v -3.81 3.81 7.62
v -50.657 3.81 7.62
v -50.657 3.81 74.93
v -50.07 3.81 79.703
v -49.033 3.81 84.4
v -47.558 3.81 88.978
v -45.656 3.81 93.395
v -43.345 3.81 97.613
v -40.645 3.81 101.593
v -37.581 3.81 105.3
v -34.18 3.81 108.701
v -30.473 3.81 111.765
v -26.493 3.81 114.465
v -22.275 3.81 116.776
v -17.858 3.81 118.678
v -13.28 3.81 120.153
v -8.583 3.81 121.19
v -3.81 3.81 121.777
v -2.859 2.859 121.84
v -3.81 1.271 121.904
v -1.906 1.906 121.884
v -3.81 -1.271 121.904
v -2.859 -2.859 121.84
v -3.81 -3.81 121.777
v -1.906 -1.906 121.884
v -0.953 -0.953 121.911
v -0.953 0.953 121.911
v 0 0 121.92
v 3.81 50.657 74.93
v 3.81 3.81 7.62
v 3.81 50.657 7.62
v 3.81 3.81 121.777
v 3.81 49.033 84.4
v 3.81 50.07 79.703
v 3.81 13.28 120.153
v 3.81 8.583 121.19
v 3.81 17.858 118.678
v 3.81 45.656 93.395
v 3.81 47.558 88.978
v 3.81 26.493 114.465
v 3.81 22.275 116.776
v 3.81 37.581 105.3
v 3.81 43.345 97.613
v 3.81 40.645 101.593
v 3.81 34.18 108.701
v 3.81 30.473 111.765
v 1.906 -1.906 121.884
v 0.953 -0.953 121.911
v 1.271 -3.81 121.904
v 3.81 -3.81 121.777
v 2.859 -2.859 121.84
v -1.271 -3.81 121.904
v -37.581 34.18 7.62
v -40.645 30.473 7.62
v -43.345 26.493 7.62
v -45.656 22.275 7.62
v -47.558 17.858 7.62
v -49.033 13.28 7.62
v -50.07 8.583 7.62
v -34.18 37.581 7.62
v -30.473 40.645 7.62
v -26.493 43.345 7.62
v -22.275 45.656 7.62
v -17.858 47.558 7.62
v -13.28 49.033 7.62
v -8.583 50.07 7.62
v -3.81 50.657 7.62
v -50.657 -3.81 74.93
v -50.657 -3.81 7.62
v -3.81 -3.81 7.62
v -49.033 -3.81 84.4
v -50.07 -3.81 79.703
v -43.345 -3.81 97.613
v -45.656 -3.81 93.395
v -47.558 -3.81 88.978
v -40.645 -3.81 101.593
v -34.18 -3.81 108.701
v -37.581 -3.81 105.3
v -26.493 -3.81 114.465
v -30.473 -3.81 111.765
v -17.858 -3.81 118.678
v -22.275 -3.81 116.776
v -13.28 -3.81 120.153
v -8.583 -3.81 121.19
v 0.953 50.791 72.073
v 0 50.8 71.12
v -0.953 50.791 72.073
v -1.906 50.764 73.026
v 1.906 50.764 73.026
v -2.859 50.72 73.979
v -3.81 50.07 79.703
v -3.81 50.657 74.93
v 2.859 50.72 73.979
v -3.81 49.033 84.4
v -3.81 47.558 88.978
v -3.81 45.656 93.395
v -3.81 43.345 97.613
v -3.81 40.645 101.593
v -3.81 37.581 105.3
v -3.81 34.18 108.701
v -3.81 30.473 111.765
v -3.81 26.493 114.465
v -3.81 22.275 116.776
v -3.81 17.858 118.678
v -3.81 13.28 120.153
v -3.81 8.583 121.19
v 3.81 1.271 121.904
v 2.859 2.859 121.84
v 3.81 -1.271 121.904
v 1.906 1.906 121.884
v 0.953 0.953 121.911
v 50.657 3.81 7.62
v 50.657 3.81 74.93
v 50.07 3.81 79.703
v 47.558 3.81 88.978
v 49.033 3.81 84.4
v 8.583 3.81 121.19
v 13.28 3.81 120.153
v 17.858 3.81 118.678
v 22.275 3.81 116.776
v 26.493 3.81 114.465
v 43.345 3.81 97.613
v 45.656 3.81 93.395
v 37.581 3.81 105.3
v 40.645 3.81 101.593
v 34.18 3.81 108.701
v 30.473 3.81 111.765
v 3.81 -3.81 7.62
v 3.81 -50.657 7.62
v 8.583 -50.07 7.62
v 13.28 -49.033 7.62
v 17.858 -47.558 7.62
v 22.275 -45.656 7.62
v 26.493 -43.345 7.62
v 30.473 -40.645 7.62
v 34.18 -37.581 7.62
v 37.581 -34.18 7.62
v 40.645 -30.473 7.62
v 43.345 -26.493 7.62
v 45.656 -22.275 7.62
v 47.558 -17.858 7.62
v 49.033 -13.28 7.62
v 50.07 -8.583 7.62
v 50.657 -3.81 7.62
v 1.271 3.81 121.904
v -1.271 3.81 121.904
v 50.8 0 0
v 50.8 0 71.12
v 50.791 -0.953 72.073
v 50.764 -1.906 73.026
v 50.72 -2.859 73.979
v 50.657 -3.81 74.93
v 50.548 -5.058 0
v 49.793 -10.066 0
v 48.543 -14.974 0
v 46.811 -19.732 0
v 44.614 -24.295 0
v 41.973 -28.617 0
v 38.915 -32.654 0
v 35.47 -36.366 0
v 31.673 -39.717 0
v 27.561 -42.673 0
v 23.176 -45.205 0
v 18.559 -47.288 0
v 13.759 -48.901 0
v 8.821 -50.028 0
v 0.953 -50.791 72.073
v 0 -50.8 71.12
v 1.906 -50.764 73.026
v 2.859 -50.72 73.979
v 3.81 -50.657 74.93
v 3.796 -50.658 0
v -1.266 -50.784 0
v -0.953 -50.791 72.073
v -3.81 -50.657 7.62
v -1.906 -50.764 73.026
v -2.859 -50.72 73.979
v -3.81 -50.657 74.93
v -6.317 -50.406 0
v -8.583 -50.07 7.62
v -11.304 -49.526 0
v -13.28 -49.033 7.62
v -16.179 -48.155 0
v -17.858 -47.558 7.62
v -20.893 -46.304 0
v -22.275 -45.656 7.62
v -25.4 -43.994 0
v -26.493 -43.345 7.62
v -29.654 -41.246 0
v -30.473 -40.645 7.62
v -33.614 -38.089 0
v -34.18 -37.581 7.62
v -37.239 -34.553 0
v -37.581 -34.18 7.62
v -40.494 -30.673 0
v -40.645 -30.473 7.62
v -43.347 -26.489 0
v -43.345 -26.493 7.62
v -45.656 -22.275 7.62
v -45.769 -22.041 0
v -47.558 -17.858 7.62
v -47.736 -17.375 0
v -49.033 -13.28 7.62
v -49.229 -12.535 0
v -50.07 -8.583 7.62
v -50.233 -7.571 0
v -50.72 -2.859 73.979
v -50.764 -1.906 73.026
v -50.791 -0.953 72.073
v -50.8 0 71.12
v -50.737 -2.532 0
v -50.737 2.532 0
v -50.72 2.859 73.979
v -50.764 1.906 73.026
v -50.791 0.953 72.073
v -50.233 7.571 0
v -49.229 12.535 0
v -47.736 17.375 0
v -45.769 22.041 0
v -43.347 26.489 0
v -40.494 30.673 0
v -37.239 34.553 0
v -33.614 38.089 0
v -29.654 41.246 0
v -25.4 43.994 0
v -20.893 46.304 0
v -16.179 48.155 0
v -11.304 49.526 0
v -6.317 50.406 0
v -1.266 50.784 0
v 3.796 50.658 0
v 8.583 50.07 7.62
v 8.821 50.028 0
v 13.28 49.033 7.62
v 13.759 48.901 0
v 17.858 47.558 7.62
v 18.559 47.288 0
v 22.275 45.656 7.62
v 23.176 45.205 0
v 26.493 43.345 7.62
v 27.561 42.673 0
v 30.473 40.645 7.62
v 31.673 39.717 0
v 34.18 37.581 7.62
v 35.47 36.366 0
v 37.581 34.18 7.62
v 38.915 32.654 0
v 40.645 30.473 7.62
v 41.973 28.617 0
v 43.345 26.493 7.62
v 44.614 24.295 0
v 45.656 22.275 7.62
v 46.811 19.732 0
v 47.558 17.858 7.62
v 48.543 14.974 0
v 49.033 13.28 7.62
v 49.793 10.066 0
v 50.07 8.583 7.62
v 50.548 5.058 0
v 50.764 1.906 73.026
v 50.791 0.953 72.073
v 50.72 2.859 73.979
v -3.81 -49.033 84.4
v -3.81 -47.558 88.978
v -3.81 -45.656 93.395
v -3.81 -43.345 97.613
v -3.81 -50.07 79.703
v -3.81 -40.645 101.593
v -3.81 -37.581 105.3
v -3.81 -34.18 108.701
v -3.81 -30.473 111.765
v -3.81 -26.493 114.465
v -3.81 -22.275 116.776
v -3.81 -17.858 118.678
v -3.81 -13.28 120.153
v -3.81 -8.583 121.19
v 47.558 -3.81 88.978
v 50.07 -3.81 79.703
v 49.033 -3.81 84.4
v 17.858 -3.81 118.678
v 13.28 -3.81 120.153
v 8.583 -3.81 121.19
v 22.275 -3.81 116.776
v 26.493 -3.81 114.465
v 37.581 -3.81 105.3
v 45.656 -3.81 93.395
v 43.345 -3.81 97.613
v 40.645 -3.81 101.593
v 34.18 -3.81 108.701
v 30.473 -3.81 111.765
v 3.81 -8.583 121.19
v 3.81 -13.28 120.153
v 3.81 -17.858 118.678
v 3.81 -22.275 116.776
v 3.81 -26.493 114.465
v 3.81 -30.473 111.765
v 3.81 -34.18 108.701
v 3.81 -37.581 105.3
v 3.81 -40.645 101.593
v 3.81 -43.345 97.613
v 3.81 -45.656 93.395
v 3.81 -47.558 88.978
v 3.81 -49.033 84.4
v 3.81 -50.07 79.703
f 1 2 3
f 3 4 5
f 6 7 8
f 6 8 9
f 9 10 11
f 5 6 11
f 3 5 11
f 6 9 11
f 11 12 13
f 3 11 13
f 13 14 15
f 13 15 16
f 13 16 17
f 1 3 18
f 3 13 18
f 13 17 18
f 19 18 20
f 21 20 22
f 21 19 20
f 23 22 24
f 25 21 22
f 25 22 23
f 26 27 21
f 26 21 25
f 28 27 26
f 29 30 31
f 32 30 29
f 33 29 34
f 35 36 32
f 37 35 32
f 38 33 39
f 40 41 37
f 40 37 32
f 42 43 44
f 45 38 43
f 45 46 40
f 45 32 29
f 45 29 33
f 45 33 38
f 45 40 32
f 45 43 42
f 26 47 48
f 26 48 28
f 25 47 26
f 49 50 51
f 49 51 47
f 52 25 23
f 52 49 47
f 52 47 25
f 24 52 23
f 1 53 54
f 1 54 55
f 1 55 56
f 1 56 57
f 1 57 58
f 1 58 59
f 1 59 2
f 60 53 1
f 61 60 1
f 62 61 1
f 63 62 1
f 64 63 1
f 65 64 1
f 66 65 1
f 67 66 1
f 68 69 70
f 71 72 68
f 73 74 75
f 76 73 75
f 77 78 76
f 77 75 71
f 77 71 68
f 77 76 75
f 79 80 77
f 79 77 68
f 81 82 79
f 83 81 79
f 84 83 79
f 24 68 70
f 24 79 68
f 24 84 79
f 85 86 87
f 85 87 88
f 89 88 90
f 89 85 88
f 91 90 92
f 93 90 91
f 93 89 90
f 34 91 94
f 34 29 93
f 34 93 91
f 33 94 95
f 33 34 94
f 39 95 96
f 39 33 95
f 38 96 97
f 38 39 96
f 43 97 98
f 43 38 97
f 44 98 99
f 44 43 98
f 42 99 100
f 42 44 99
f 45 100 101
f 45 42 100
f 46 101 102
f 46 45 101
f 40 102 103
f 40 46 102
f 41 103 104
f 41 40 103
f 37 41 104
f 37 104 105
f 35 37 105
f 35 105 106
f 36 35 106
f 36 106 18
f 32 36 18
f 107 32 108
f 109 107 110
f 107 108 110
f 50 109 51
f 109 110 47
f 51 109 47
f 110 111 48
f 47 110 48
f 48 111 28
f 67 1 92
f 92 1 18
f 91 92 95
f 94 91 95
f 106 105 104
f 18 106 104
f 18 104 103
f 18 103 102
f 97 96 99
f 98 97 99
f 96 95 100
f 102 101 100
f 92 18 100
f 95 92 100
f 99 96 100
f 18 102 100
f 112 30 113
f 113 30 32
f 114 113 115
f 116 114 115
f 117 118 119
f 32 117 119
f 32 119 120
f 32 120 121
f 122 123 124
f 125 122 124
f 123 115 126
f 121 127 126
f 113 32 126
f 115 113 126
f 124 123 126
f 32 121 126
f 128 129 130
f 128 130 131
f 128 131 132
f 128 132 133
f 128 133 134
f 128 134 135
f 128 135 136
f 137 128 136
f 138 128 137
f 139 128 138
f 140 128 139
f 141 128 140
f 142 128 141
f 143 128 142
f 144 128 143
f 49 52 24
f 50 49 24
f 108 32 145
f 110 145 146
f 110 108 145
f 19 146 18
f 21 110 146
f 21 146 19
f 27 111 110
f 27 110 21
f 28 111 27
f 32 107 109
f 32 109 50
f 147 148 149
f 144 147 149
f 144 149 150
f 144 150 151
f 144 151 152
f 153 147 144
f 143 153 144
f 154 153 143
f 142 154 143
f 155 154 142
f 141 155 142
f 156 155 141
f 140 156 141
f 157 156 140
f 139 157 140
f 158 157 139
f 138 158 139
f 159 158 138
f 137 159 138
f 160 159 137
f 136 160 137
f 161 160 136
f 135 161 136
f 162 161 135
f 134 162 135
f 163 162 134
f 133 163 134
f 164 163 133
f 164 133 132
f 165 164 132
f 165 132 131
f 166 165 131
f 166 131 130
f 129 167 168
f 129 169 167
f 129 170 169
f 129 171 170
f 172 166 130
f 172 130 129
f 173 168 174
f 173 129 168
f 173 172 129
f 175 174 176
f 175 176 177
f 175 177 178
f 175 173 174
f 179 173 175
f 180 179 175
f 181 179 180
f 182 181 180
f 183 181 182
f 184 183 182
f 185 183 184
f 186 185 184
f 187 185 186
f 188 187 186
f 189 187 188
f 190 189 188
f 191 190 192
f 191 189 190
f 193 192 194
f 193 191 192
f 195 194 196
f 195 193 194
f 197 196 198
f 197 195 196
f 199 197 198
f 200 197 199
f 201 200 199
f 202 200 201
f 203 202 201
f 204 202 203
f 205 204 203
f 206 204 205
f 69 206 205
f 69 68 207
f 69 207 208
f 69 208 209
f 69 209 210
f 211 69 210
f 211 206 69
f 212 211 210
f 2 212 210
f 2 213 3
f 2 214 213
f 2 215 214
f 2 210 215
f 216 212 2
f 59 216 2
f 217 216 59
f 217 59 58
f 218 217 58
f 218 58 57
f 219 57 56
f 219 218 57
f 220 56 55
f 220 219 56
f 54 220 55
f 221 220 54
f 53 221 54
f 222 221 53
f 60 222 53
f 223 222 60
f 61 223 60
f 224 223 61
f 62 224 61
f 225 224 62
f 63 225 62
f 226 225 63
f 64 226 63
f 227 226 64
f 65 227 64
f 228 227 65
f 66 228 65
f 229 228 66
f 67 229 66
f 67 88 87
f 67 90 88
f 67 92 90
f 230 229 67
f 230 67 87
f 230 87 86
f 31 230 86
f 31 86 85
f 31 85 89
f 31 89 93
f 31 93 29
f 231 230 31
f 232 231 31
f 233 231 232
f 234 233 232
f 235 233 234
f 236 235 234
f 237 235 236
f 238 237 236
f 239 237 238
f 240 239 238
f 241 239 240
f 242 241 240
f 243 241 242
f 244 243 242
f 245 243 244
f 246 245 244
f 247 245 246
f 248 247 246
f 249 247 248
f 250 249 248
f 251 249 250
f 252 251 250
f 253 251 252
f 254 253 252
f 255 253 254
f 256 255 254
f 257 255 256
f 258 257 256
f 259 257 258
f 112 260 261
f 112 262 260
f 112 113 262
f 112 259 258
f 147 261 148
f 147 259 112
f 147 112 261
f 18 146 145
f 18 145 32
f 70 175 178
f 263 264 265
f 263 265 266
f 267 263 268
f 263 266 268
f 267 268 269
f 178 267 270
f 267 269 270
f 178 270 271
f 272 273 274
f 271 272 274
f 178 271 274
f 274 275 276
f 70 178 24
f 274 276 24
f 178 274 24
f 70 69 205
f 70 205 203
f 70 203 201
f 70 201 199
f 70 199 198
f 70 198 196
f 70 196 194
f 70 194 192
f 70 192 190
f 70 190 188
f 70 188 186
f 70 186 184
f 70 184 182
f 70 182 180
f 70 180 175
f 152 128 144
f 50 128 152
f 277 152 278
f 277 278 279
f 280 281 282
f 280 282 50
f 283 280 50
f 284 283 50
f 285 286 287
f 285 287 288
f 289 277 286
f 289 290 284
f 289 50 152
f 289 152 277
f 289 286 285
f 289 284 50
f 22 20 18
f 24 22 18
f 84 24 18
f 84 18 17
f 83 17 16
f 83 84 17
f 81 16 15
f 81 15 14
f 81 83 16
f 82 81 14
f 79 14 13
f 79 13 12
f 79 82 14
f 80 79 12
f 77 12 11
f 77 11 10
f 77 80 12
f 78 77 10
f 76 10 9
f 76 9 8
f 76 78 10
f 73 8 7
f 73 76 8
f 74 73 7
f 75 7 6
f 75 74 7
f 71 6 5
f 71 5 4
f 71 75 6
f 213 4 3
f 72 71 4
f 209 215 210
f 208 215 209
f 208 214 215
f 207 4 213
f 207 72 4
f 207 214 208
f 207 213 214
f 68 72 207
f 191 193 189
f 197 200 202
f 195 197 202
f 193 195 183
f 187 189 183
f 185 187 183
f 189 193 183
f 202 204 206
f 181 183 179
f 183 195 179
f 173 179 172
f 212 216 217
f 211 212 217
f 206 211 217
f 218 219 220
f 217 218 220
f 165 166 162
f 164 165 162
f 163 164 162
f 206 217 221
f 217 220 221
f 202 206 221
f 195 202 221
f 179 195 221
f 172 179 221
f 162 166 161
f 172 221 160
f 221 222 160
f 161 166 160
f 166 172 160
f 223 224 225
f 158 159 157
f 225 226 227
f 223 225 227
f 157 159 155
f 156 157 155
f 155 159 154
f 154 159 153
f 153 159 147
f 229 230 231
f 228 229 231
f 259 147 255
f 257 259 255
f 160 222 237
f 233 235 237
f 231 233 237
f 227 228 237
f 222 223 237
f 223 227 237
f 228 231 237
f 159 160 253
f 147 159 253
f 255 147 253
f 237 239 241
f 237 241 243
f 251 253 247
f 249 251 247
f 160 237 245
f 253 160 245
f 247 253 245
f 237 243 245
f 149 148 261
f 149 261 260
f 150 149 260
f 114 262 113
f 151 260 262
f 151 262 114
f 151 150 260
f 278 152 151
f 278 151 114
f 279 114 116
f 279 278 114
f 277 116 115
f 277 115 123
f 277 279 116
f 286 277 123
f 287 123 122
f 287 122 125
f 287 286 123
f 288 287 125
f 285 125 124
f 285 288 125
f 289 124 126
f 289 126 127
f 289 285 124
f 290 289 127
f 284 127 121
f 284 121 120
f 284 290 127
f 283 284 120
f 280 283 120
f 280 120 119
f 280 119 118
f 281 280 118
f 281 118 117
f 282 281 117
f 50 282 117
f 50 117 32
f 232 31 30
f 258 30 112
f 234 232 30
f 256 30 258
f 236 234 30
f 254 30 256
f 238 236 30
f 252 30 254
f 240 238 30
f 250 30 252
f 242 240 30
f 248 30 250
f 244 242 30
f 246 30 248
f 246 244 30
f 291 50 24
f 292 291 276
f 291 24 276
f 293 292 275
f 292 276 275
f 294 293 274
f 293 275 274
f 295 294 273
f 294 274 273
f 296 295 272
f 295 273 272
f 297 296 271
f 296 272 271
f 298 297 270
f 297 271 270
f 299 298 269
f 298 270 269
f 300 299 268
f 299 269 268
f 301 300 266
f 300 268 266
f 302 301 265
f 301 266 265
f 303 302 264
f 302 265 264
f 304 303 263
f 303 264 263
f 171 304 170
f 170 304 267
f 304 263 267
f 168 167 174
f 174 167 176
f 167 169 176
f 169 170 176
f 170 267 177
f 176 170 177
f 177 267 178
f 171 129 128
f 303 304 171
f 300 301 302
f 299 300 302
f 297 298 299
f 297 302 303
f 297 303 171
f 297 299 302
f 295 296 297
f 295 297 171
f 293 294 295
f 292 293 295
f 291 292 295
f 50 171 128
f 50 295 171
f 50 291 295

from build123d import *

# Parameters (mm, degrees)
F0_R          = 50.8
F1_DEPTH      = 7.62
F3_DEPTH      = 3.81
F3_DEPTH_BACK = 3.81
F5_DEPTH      = 3.81
F5_DEPTH_BACK = 3.81
F6_R          = 73.848942
F6_R_2        = 50.8
F7_DEPTH      = 127


with BuildPart() as f1:
    # F0 (on Top) → F1 (new body)
    with BuildSketch(Plane.XY):
        Circle(F0_R)
    extrude(amount=F1_DEPTH)

    # F2 (on Front) → F3 (join, two sides)
    with BuildSketch(Plane.XZ) as f3_sk:
        with BuildLine():
            Line((50.8, 7.62), (50.8, 71.12))
            ThreePointArc((50.8, 71.12), (0, 121.92), (-50.8, 71.12))
            Line((-50.8, 71.12), (-50.8, 7.62))
            Line((-50.8, 7.62), (50.8, 7.62))
        make_face()
    extrude(amount=F3_DEPTH)
    extrude(f3_sk.sketch, amount=-F3_DEPTH_BACK)

    # F4 (on Right) → F5 (join, two sides)
    with BuildSketch(Plane.YZ) as f5_sk:
        with BuildLine():
            Line((50.8, 7.62), (50.8, 71.12))
            ThreePointArc((50.8, 71.12), (0, 121.92), (-50.8, 71.12))
            Line((-50.8, 71.12), (-50.8, 7.62))
            Line((-50.8, 7.62), (50.8, 7.62))
        make_face()
    extrude(amount=F5_DEPTH)
    extrude(f5_sk.sketch, amount=-F5_DEPTH_BACK)

    # F6 (on face) → F7 (cut)
    with BuildSketch(Plane(origin=(0, 0, 0), x_dir=(1, 0, 0), z_dir=(0, 0, -1))):
        Circle(F6_R)
        Circle(F6_R_2, mode=Mode.SUBTRACT)
    extrude(amount=-F7_DEPTH, mode=Mode.SUBTRACT)


solid = f1.part
